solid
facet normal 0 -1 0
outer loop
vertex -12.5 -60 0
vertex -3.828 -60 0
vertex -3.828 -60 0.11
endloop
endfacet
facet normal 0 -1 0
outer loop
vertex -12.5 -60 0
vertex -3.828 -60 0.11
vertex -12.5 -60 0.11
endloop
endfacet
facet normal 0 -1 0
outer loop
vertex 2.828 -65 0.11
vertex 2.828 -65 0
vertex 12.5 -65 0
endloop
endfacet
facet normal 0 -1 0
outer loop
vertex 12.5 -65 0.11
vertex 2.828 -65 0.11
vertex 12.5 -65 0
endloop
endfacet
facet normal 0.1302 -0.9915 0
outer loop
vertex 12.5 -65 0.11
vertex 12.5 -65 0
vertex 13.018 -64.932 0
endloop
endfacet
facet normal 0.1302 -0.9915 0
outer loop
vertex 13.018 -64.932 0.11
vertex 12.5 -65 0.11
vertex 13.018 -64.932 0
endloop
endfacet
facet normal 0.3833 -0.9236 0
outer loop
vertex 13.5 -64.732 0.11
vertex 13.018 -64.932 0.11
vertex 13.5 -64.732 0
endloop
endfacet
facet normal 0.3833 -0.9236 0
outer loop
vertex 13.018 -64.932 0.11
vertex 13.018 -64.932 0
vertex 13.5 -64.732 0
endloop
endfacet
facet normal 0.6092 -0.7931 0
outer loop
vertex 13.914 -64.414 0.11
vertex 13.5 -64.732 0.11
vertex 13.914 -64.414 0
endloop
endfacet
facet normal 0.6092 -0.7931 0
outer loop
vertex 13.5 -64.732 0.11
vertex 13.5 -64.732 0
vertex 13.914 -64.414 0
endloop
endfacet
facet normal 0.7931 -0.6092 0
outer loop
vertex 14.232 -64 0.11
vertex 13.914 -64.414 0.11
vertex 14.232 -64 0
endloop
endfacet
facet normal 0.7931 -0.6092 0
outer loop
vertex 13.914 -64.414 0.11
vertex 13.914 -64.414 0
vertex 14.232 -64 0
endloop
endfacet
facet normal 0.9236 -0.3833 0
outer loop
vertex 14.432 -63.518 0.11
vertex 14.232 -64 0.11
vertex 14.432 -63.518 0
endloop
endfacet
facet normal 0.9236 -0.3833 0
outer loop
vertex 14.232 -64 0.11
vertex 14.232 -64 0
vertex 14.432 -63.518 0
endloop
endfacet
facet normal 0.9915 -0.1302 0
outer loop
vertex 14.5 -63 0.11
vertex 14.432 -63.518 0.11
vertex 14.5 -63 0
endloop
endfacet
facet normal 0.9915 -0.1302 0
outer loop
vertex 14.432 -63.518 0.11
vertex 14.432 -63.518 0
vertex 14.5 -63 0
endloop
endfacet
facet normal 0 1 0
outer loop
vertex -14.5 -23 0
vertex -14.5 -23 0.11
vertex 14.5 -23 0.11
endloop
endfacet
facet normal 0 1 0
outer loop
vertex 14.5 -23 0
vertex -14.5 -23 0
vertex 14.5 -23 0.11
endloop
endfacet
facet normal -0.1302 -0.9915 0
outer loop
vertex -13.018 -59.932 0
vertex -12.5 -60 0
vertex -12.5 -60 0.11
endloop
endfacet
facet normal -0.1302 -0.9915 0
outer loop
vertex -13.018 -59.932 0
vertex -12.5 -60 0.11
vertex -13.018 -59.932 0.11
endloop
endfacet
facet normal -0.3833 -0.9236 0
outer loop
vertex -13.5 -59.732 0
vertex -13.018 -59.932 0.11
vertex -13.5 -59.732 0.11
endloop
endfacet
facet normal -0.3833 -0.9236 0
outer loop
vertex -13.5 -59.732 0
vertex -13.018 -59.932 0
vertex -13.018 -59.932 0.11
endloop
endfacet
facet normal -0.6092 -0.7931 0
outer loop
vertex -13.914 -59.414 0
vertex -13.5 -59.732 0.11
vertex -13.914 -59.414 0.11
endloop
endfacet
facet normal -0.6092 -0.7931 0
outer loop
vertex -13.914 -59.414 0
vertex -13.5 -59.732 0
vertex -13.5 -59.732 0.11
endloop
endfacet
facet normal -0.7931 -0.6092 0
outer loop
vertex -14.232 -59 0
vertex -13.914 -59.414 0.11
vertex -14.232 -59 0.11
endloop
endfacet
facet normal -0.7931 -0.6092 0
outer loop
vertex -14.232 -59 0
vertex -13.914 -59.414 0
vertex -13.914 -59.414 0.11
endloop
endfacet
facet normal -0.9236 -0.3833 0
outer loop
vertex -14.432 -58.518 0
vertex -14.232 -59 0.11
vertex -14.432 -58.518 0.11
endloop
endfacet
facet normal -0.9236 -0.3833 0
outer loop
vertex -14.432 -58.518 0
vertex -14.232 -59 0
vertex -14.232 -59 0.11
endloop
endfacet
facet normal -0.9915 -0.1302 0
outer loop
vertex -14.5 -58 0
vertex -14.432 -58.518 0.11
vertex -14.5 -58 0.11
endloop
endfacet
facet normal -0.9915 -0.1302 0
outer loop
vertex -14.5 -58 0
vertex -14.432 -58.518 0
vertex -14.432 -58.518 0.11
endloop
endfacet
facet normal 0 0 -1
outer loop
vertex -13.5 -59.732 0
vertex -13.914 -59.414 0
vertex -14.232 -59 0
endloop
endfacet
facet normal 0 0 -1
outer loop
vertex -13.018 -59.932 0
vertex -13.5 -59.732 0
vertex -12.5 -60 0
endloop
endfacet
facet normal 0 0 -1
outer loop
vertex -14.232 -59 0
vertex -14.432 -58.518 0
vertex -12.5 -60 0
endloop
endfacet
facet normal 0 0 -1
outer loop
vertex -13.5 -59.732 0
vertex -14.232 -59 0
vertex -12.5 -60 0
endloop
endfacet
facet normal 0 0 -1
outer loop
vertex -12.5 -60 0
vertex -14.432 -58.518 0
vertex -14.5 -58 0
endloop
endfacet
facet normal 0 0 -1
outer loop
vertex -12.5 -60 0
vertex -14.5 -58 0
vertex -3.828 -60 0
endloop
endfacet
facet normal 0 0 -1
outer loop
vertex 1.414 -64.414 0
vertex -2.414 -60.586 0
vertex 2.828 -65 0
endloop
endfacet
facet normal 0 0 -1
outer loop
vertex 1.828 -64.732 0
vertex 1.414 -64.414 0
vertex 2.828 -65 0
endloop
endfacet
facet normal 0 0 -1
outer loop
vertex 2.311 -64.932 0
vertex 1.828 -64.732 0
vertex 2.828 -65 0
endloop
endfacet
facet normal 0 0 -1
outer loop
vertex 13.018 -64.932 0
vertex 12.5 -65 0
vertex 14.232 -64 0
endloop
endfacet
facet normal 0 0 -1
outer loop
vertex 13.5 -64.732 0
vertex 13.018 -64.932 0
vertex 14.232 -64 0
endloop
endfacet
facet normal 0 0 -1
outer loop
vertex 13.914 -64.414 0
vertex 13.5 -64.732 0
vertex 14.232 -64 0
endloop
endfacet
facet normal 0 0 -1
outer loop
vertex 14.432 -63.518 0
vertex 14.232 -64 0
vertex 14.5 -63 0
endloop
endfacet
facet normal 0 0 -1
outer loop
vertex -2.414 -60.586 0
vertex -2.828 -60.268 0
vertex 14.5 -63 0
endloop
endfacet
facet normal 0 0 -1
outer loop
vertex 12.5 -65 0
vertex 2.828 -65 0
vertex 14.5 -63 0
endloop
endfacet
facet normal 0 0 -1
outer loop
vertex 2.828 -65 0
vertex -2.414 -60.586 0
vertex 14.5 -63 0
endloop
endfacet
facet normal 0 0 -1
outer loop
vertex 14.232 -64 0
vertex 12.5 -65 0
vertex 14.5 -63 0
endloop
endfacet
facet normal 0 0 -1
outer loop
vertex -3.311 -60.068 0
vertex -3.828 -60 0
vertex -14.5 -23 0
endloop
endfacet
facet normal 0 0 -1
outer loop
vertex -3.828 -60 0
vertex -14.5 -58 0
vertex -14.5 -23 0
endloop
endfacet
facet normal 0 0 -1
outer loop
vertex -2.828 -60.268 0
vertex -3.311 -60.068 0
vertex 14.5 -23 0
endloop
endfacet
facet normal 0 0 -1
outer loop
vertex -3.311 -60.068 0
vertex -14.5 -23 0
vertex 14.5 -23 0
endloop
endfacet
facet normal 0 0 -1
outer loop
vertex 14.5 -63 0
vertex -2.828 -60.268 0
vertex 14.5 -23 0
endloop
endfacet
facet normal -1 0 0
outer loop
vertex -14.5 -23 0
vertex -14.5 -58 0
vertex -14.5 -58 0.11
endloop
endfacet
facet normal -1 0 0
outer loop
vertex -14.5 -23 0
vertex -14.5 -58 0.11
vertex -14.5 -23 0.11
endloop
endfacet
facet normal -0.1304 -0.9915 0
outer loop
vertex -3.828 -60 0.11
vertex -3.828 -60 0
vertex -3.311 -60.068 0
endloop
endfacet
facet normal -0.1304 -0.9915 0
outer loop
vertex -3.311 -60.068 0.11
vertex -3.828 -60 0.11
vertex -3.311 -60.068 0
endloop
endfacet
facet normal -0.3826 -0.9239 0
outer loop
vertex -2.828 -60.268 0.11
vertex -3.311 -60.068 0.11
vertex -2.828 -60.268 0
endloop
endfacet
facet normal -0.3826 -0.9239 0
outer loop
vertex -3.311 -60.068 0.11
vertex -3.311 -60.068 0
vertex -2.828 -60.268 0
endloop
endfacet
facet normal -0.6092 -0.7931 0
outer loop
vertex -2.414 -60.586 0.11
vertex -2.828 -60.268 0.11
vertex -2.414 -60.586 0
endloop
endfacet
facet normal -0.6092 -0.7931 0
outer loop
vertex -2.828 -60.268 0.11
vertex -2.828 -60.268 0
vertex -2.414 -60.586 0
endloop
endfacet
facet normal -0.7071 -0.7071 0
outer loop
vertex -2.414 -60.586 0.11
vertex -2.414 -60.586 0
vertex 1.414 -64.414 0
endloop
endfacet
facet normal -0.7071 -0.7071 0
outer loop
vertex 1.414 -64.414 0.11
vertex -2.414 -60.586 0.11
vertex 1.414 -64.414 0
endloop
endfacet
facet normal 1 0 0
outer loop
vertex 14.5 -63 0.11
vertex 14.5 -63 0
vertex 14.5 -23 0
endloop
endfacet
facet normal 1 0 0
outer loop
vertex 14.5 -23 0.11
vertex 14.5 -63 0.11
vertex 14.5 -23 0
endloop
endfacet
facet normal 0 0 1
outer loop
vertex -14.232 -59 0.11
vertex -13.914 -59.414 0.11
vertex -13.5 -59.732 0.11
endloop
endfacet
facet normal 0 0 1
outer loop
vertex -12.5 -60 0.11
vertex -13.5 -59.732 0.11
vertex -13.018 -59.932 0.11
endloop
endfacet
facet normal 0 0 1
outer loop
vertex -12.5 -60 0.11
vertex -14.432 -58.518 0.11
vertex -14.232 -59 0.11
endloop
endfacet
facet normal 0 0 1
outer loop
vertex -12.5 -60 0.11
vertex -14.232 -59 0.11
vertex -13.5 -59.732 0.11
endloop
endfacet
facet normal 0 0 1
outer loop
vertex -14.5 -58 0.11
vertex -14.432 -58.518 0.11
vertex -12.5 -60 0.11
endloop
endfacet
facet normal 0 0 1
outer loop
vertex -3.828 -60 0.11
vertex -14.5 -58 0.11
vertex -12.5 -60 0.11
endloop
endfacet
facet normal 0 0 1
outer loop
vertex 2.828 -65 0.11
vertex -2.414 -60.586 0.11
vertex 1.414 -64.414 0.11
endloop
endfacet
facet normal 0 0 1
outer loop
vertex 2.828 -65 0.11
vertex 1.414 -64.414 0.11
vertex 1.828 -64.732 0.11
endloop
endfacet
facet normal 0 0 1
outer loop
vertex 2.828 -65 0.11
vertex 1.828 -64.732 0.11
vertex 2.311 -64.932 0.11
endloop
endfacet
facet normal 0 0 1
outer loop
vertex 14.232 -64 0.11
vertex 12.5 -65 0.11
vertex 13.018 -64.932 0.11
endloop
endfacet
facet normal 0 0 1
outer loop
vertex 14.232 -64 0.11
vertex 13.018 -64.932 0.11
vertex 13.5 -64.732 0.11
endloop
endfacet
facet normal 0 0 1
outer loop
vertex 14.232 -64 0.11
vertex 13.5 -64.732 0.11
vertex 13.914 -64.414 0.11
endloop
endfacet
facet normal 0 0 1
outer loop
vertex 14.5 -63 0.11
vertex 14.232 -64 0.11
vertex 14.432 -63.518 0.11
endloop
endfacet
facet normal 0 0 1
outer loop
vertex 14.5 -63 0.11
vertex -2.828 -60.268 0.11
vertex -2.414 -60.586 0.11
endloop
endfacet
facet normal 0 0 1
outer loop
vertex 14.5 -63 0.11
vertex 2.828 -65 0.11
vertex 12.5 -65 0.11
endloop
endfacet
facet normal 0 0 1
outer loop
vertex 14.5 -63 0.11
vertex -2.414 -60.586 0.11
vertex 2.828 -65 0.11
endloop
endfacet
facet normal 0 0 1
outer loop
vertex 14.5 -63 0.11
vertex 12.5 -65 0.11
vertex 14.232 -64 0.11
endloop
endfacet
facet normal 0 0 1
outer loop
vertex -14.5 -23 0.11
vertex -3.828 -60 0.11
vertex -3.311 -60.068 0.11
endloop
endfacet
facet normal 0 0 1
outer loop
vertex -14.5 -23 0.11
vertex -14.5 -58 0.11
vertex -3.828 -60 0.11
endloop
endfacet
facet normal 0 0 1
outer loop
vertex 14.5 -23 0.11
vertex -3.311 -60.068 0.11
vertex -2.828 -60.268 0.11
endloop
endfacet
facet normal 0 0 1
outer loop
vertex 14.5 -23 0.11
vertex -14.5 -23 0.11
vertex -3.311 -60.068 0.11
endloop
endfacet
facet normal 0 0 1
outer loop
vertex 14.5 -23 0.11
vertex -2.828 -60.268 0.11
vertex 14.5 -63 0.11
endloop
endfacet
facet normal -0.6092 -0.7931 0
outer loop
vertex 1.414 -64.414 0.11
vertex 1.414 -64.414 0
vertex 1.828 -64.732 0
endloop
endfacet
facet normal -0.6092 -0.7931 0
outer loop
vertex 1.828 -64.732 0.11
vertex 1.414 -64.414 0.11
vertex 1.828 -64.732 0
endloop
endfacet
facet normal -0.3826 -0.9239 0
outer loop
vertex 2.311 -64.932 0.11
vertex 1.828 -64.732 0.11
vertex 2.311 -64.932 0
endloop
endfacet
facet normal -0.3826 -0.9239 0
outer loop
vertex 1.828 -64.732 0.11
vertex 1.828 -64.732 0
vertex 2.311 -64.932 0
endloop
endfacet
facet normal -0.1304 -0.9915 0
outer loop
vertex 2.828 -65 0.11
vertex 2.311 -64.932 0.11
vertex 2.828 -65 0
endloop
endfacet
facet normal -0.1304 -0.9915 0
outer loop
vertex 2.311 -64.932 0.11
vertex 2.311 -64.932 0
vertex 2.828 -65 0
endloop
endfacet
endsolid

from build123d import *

# Parameters (mm, degrees)
BOSS_EXTRUDE1_DEPTH = 0.11
CUT_EXTRUDE1_DEPTH  = 62.727320532
BOSS_EXTRUDE2_START = -0.11
BOSS_EXTRUDE2_DEPTH = 0.11


with BuildPart() as part:
    # Sketch3 → Boss-Extrude1 (new body)
    with BuildSketch(Plane.XY):
        with BuildLine():
            Line((-12.5, 60), (4.5, 60))
            ThreePointArc((4.5, 60), (11.571067812, 57.071067812), (14.5, 50))
            Line((14.5, 50), (14.5, -58))
            ThreePointArc((14.5, -58), (13.914213562, -59.414213562), (12.5, -60))
            Line((12.5, -60), (-12.5, -60))
            ThreePointArc((-12.5, -60), (-13.914213562, -59.414213562), (-14.5, -58))
            Line((-14.5, -58), (-14.5, 58))
            ThreePointArc((-14.5, 58), (-13.914213562, 59.414213562), (-12.5, 60))
        make_face()
    extrude(amount=BOSS_EXTRUDE1_DEPTH)

    # Sketch4 → Cut-Extrude1 (cut, through all)
    with BuildSketch(Plane.XY.offset(0.11)):
        with BuildLine():
            Line((-14.5, -23), (14.5, -23))
            Line((14.5, -23), (14.5, 50))
            ThreePointArc((14.5, 50), (11.571067812, 57.071067812), (4.5, 60))
            Line((4.5, 60), (-12.5, 60))
            ThreePointArc((-12.5, 60), (-13.914213562, 59.414213562), (-14.5, 58))
            Line((-14.5, 58), (-14.5, -23))
        make_face()
    extrude(amount=-CUT_EXTRUDE1_DEPTH, mode=Mode.SUBTRACT)

    # Sketch5 → Boss-Extrude2 (add)
    with BuildSketch(Plane.XY.offset(0.11).offset(BOSS_EXTRUDE2_START)):
        with BuildLine():
            Line((14.5, -63), (14.5, -23))
            Line((14.5, -23), (-14.5, -23))
            Line((-14.5, -23), (-14.5, -58))
            ThreePointArc((-14.5, -58), (-13.914213562, -59.414213562), (-12.5, -60))
            Line((-12.5, -60), (-3.828427125, -60))
            ThreePointArc((-3.828427125, -60), (-3.06306026, -60.152240935), (-2.414213562, -60.585786438))
            Line((-2.414213562, -60.585786438), (1.414213562, -64.414213562))
            ThreePointArc((1.414213562, -64.414213562), (2.06306026, -64.847759065), (2.828427125, -65))
            Line((2.828427125, -65), (12.5, -65))
            ThreePointArc((12.5, -65), (13.914213562, -64.414213562), (14.5, -63))
        make_face()
    extrude(amount=BOSS_EXTRUDE2_DEPTH)


solid = part.part
